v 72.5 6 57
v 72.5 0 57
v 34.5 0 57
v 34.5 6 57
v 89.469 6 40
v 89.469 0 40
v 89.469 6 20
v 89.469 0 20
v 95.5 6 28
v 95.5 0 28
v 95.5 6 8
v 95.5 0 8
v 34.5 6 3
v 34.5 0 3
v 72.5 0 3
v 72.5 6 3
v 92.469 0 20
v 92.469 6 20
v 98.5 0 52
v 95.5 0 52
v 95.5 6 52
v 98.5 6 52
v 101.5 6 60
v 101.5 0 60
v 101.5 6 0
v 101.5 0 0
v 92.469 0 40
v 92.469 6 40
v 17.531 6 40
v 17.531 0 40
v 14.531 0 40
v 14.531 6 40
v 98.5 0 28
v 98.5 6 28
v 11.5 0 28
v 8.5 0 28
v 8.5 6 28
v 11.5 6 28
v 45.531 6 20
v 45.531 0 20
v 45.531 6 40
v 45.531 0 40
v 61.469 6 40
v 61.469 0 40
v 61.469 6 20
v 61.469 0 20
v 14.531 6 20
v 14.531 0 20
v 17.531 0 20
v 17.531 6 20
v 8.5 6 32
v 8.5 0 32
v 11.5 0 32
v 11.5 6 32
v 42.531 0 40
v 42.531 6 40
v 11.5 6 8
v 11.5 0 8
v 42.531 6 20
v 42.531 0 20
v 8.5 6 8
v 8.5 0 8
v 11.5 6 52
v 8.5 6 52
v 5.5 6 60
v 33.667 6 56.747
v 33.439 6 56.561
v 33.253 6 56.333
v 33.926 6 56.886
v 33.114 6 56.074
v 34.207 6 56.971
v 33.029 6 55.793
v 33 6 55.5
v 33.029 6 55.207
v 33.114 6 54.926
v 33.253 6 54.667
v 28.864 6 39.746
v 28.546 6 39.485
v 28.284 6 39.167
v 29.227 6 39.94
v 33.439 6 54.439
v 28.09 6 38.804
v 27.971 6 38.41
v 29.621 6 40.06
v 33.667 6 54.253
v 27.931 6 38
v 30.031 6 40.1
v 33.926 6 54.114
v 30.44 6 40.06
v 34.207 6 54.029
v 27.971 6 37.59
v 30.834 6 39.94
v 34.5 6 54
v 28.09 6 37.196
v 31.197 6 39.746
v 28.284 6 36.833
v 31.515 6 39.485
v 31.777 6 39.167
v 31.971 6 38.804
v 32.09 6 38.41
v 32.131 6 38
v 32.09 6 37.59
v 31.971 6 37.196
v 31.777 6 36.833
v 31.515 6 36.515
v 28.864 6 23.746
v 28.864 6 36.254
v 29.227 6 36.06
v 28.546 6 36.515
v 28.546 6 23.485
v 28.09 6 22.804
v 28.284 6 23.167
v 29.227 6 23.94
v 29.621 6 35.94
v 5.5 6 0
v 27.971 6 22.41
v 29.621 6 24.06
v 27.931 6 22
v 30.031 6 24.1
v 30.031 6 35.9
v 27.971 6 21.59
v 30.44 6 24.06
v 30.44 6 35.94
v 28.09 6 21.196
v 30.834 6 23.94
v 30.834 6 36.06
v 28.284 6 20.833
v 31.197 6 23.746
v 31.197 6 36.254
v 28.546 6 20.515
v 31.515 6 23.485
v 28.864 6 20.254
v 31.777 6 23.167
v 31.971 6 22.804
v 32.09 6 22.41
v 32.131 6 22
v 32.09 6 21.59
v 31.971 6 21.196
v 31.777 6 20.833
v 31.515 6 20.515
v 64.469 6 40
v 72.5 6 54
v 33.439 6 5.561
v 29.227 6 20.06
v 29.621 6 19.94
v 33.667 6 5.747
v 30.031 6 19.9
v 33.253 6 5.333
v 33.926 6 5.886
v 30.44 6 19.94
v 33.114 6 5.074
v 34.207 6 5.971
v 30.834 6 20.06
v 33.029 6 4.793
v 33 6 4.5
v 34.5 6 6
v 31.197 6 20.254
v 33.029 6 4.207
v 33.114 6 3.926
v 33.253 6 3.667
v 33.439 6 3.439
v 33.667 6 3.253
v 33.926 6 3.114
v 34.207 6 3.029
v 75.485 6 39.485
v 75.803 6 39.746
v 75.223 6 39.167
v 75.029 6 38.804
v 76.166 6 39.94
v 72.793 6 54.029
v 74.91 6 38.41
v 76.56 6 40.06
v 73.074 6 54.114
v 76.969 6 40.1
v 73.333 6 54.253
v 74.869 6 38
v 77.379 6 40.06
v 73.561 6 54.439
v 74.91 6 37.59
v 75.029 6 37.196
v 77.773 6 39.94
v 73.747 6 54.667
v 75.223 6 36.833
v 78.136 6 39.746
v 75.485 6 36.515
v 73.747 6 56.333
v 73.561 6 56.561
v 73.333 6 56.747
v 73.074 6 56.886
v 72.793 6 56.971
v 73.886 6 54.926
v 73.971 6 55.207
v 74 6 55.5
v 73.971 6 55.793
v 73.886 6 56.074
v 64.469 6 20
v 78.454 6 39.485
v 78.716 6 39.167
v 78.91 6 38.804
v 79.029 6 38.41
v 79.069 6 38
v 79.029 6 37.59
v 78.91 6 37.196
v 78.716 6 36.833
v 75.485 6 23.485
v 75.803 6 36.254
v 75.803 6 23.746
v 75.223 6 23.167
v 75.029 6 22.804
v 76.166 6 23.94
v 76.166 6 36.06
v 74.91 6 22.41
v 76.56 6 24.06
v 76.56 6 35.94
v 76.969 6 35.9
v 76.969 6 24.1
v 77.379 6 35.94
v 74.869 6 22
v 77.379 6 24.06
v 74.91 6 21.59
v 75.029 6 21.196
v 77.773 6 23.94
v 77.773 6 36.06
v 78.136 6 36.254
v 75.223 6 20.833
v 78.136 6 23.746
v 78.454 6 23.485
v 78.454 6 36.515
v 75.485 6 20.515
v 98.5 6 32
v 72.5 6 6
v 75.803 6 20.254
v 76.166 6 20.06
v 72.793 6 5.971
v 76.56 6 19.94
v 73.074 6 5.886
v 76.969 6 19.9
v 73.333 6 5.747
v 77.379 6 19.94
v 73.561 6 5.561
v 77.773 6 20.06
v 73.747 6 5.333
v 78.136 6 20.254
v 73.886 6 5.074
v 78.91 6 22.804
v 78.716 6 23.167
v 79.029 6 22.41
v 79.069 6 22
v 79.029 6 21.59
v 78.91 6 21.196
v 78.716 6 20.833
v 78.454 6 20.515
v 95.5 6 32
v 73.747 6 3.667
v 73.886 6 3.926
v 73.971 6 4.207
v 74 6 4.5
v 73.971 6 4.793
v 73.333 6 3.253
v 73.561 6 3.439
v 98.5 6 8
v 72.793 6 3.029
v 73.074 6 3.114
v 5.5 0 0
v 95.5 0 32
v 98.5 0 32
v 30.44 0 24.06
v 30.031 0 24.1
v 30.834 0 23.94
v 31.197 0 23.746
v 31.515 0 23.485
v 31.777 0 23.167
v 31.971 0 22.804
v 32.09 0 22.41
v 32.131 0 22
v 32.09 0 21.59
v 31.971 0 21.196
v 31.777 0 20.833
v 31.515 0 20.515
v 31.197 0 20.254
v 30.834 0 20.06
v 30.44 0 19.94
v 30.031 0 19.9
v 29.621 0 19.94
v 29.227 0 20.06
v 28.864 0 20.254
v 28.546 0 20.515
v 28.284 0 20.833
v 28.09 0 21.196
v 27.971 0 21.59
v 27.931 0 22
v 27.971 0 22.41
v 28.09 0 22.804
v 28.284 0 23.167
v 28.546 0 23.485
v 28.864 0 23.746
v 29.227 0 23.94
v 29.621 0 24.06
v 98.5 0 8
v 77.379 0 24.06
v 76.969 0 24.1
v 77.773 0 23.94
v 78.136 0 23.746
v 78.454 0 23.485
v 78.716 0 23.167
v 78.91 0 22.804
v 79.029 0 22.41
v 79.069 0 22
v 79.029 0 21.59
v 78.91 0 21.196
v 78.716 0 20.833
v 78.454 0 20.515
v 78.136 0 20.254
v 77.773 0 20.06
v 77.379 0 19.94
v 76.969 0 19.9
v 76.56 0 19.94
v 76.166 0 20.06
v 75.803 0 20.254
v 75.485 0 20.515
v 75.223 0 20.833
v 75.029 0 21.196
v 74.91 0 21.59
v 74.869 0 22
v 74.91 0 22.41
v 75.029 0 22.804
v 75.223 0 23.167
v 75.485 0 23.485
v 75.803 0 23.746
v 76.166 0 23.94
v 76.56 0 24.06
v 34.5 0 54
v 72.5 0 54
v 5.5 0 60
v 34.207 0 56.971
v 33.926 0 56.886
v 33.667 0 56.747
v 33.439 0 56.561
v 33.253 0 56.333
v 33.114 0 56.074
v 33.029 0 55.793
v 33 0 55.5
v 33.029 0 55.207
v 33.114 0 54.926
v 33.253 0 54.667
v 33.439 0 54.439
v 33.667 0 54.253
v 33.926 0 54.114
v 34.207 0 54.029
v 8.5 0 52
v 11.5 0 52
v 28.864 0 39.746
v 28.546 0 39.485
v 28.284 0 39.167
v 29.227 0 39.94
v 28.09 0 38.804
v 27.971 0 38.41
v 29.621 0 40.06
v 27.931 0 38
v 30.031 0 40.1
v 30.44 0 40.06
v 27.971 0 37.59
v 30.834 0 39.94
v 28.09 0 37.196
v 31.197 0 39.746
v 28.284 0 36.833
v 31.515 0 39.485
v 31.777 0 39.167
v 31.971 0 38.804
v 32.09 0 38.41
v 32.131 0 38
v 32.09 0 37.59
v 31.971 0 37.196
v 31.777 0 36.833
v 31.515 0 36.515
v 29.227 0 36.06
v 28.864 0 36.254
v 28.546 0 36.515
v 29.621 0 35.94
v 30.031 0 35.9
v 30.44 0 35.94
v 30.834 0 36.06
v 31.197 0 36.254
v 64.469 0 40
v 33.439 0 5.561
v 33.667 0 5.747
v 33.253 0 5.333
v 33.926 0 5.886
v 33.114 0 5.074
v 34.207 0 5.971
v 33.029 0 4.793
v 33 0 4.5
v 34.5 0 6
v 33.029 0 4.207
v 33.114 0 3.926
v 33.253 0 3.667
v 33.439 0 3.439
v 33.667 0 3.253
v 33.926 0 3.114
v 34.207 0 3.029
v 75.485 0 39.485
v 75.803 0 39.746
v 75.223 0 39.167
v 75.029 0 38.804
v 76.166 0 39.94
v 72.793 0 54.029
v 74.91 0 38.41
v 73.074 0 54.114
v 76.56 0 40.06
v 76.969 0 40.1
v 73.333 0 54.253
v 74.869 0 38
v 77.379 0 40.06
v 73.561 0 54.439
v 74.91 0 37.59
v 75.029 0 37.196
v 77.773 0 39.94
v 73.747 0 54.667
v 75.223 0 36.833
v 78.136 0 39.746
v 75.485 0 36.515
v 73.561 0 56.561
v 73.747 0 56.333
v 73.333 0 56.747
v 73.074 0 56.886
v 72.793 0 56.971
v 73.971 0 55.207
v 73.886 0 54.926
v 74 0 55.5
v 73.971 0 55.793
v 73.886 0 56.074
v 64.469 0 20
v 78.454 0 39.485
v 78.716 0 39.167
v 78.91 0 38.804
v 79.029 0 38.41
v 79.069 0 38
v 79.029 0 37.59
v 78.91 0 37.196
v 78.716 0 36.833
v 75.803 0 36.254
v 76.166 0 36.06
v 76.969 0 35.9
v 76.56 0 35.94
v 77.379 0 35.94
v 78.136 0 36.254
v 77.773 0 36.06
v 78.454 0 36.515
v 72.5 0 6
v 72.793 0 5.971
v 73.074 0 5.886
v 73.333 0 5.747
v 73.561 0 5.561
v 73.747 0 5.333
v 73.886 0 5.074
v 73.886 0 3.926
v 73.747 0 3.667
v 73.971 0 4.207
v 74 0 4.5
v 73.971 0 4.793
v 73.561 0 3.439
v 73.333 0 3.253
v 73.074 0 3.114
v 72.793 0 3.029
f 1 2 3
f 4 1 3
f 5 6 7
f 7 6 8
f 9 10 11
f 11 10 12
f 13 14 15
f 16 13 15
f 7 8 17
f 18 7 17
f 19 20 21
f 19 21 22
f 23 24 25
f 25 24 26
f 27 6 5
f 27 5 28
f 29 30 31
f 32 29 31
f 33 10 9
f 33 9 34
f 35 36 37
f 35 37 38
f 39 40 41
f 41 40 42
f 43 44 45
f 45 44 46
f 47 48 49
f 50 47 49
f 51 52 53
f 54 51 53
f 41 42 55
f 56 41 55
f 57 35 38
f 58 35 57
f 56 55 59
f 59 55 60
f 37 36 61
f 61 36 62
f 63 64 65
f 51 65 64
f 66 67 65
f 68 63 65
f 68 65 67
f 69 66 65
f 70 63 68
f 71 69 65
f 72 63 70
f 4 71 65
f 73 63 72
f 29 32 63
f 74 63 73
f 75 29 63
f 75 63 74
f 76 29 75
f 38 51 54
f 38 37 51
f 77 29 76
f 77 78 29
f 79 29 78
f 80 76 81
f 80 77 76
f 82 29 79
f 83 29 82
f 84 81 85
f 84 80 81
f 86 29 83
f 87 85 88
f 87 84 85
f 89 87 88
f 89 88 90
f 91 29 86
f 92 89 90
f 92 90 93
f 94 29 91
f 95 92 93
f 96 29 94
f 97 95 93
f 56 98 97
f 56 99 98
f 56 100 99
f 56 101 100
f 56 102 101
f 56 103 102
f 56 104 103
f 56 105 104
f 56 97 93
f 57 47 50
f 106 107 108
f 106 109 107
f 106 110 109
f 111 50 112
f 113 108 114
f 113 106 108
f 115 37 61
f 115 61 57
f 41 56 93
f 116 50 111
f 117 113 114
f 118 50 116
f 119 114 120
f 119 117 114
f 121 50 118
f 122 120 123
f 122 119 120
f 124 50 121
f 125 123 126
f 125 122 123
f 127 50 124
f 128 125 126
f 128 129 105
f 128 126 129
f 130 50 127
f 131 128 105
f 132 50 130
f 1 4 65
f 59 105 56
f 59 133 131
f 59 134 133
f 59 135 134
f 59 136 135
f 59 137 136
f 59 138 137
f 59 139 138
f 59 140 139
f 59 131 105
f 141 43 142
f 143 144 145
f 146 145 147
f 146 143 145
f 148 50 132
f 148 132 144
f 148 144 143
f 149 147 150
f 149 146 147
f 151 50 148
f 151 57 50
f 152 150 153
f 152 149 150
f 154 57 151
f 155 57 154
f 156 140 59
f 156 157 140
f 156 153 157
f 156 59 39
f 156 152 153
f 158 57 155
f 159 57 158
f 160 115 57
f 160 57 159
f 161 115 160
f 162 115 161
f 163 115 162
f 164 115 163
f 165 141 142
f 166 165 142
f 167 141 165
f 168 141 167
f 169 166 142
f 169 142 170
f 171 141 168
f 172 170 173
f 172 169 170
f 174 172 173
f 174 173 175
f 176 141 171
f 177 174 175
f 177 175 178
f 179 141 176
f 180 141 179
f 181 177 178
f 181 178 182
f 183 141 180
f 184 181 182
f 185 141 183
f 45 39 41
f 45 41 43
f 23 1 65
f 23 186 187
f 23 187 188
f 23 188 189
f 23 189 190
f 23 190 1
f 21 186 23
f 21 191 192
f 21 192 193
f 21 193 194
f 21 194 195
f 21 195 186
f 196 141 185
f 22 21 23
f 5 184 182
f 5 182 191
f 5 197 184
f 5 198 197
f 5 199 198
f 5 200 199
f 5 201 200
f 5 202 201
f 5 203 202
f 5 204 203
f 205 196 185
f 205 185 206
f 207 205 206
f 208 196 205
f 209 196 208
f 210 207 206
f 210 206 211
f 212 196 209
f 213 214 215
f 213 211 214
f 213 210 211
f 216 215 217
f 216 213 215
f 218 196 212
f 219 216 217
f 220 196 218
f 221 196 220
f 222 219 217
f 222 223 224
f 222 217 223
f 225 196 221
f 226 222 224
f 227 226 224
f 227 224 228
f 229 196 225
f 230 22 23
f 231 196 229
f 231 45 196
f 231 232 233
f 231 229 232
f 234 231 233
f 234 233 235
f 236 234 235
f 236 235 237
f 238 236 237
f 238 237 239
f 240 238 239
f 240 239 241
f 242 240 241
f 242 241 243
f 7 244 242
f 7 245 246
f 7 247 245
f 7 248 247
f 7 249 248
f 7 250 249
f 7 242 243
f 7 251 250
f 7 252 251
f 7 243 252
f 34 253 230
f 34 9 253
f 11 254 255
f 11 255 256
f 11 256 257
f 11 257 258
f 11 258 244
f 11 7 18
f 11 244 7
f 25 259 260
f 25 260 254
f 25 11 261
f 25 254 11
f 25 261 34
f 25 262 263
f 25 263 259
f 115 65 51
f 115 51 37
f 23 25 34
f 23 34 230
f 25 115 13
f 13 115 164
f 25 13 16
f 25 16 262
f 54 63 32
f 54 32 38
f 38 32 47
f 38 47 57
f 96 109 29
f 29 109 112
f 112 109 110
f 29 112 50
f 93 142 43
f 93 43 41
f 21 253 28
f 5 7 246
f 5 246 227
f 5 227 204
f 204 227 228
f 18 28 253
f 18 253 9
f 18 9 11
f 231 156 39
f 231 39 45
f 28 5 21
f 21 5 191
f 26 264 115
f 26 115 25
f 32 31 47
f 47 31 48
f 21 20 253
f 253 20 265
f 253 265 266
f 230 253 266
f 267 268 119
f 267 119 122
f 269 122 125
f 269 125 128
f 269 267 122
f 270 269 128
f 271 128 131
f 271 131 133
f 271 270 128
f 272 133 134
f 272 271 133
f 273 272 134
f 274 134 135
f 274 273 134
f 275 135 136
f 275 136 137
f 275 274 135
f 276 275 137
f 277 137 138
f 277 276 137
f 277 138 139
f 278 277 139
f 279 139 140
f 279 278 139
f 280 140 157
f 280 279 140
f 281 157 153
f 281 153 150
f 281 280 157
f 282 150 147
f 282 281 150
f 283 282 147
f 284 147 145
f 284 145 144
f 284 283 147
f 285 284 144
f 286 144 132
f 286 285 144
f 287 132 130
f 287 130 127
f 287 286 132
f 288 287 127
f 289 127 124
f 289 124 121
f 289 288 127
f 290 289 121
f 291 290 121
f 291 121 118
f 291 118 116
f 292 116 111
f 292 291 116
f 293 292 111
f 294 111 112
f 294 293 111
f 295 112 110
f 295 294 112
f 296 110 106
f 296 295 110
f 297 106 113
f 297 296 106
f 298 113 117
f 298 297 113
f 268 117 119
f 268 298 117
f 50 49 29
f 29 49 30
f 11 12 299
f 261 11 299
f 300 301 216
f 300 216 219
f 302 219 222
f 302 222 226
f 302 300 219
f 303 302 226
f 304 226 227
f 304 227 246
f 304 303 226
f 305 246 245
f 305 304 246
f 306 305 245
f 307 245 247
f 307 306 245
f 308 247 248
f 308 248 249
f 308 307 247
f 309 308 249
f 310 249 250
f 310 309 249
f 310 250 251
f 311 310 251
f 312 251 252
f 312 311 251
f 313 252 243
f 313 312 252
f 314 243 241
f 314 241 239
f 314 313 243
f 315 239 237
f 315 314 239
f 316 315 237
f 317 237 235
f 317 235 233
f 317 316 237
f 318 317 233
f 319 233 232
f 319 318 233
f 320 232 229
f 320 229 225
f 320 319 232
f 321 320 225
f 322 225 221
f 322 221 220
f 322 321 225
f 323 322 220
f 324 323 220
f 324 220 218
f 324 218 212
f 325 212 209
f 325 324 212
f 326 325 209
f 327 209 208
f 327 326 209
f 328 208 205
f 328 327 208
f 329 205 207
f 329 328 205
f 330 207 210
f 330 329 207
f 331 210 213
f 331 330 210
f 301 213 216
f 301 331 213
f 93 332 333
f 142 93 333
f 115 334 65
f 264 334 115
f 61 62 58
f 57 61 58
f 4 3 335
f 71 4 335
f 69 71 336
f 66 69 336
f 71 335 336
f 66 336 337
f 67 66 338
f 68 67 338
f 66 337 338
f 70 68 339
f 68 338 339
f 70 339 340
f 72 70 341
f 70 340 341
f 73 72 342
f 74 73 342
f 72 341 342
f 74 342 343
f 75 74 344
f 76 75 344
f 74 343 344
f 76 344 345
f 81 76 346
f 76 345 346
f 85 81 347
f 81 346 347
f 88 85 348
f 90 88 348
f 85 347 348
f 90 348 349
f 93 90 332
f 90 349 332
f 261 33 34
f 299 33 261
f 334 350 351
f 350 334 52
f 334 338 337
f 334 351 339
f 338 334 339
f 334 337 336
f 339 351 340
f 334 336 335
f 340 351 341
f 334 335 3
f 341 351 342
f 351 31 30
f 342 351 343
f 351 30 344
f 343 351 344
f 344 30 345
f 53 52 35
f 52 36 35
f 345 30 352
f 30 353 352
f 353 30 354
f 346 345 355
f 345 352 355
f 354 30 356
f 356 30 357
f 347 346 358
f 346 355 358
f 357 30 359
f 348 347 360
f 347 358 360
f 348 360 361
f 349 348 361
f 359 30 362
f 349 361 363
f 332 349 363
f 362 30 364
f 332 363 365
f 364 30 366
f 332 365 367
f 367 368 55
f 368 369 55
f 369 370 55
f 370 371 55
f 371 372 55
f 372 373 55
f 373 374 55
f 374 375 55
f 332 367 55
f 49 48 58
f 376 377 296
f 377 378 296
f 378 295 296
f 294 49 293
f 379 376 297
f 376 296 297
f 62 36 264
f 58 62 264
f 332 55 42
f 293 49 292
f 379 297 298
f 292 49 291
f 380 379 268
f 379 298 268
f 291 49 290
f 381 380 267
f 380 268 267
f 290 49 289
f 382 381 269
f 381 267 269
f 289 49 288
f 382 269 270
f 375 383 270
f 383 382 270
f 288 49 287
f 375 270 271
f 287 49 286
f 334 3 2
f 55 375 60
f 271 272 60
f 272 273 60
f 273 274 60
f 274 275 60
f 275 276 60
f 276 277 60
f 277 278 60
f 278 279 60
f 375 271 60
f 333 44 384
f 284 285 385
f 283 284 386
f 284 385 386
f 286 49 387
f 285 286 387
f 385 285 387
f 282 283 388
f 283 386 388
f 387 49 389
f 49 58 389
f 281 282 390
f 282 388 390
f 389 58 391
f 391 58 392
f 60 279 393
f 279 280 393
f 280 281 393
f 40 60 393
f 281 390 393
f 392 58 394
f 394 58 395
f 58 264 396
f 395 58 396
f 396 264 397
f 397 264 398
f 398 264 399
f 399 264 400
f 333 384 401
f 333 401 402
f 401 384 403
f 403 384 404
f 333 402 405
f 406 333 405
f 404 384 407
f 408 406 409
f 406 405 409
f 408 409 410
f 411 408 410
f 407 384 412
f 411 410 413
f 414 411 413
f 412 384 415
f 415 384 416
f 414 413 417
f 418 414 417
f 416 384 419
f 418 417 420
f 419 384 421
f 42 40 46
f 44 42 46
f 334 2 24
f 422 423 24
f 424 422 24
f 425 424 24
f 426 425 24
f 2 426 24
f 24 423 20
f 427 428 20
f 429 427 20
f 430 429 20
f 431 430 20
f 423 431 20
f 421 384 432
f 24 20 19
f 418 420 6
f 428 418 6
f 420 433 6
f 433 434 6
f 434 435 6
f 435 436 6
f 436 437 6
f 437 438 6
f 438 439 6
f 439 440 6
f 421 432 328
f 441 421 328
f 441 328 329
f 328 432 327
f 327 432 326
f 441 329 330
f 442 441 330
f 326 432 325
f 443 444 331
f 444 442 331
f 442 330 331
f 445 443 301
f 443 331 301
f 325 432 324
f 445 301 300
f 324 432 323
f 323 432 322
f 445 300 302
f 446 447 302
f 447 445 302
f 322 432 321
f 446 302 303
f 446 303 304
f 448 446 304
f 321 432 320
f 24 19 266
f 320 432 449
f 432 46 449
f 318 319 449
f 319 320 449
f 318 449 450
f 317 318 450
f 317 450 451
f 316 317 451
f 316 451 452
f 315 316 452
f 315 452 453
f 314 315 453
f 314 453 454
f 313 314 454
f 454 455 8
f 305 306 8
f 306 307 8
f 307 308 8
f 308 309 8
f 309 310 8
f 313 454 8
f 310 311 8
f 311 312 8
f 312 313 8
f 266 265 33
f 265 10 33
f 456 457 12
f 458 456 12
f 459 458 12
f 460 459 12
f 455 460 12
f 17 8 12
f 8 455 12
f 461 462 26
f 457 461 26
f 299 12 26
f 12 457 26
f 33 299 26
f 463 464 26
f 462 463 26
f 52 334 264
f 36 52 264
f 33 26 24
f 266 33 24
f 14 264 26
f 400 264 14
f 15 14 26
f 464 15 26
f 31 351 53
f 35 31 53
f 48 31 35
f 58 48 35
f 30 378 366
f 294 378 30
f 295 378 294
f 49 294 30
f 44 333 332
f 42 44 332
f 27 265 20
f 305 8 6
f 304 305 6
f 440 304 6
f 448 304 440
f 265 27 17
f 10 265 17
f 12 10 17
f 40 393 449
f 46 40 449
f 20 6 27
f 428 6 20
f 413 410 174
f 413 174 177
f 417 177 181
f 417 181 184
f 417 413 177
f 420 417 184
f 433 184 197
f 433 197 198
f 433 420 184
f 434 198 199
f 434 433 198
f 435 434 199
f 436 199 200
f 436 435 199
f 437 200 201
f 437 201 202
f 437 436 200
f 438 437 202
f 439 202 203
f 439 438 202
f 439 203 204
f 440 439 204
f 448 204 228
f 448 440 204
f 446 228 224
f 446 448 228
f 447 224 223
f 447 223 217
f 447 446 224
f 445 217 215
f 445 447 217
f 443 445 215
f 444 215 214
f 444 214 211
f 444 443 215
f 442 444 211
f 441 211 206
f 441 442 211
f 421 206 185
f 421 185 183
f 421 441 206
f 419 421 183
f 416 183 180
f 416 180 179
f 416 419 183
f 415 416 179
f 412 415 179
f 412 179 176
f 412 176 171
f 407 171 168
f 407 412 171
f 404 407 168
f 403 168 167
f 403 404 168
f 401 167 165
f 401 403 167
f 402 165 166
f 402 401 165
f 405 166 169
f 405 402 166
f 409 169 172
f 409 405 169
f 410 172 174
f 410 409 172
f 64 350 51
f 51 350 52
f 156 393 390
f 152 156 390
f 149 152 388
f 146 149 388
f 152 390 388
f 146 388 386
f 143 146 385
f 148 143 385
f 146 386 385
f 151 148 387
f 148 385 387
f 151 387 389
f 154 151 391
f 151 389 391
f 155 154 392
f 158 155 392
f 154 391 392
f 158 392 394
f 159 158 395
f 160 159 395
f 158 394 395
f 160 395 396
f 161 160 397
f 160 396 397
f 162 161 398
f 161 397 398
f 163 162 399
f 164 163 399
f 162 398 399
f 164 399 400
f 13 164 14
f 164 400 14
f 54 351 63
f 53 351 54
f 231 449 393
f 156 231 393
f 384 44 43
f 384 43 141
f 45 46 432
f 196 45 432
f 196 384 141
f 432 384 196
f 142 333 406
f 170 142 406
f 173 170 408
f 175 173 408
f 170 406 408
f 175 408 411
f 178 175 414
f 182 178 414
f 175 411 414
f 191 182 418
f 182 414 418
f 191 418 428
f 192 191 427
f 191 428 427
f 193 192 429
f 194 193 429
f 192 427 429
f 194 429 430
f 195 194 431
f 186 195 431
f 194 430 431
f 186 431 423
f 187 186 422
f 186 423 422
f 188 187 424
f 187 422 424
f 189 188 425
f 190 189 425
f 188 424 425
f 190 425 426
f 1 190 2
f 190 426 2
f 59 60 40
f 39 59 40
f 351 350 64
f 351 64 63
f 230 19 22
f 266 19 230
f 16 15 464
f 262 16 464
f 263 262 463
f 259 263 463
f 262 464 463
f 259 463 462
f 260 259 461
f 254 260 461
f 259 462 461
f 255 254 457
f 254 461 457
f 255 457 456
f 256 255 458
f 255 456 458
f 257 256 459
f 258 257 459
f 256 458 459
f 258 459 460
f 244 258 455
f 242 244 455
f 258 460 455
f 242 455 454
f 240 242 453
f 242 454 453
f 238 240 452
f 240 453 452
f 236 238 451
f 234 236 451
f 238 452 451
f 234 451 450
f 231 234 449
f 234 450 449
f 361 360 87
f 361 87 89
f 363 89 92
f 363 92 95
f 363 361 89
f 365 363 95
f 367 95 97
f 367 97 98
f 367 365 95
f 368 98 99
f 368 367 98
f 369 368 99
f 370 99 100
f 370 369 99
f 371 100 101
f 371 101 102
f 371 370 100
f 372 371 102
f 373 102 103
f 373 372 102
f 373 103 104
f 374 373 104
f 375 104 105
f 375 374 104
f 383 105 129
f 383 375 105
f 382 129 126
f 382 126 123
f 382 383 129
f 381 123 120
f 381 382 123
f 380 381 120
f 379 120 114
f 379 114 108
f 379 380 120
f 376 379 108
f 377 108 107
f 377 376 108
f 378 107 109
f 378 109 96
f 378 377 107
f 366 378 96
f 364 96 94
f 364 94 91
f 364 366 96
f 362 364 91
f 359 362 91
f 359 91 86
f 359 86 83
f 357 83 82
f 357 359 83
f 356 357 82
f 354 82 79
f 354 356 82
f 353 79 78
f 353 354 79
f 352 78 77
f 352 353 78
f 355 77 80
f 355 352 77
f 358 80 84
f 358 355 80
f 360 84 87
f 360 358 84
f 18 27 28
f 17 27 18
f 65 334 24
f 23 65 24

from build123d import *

# Parameters (mm, degrees)
SKETCH_1_W      = 96
SKETCH_1_H      = 60
SKETCH_1_R      = 2.1
SKETCH_1_W_2    = 3
SKETCH_1_H_2    = 20
EXTRUDE_1_DEPTH = 6


with BuildPart() as part:
    # 草图1 → 凸台-拉伸1 (new body)
    with BuildSketch(Plane(origin=(0, 0, 0), x_dir=(1, 0, 0), z_dir=(0, 1, 0))):
        with Locations((53.5, -30)):
            Rectangle(SKETCH_1_W, SKETCH_1_H)
        with BuildLine():
            Line((72.5, -57), (34.5, -57))
            ThreePointArc((34.5, -57), (33, -55.5), (34.5, -54))
            Line((34.5, -54), (72.5, -54))
            ThreePointArc((72.5, -54), (74, -55.5), (72.5, -57))
        make_face(mode=Mode.SUBTRACT)
        with BuildLine():
            Line((72.5, -6), (34.5, -6))
            ThreePointArc((34.5, -6), (33, -4.5), (34.5, -3))
            Line((34.5, -3), (72.5, -3))
            ThreePointArc((72.5, -3), (74, -4.5), (72.5, -6))
        make_face(mode=Mode.SUBTRACT)
        with Locations(Location((76.969497546, -38, 0), (0, 0, 270))):
            Circle(SKETCH_1_R, mode=Mode.SUBTRACT)
        with Locations((62.969497546, -30)):
            Rectangle(SKETCH_1_W_2, SKETCH_1_H_2, mode=Mode.SUBTRACT)
        with Locations((97, -42)):
            Rectangle(SKETCH_1_W_2, SKETCH_1_H_2, mode=Mode.SUBTRACT)
        with Locations(Location((76.969497546, -22, 0), (0, 0, 270))):
            Circle(SKETCH_1_R, mode=Mode.SUBTRACT)
        with Locations((90.969497546, -30)):
            Rectangle(SKETCH_1_W_2, SKETCH_1_H_2, mode=Mode.SUBTRACT)
        with Locations((97, -18)):
            Rectangle(SKETCH_1_W_2, SKETCH_1_H_2, mode=Mode.SUBTRACT)
        with Locations((10, -18)):
            Rectangle(SKETCH_1_W_2, SKETCH_1_H_2, mode=Mode.SUBTRACT)
        with Locations(Location((30.030502454, -22, 0), (0, 0, 270))):
            Circle(SKETCH_1_R, mode=Mode.SUBTRACT)
        with Locations((10, -42)):
            Rectangle(SKETCH_1_W_2, SKETCH_1_H_2, mode=Mode.SUBTRACT)
        Polygon((14.530502454, -40), (14.530502454, -20), (17.530502454, -20), (17.530502454, -30), (17.530502454, -40), align=None, mode=Mode.SUBTRACT)
        with Locations(Location((30.030502454, -38, 0), (0, 0, 270))):
            Circle(SKETCH_1_R, mode=Mode.SUBTRACT)
        Polygon((42.530502454, -40), (42.530502454, -30), (42.530502454, -20), (45.530502454, -20), (45.530502454, -40), align=None, mode=Mode.SUBTRACT)
    extrude(amount=EXTRUDE_1_DEPTH)


solid = part.part
